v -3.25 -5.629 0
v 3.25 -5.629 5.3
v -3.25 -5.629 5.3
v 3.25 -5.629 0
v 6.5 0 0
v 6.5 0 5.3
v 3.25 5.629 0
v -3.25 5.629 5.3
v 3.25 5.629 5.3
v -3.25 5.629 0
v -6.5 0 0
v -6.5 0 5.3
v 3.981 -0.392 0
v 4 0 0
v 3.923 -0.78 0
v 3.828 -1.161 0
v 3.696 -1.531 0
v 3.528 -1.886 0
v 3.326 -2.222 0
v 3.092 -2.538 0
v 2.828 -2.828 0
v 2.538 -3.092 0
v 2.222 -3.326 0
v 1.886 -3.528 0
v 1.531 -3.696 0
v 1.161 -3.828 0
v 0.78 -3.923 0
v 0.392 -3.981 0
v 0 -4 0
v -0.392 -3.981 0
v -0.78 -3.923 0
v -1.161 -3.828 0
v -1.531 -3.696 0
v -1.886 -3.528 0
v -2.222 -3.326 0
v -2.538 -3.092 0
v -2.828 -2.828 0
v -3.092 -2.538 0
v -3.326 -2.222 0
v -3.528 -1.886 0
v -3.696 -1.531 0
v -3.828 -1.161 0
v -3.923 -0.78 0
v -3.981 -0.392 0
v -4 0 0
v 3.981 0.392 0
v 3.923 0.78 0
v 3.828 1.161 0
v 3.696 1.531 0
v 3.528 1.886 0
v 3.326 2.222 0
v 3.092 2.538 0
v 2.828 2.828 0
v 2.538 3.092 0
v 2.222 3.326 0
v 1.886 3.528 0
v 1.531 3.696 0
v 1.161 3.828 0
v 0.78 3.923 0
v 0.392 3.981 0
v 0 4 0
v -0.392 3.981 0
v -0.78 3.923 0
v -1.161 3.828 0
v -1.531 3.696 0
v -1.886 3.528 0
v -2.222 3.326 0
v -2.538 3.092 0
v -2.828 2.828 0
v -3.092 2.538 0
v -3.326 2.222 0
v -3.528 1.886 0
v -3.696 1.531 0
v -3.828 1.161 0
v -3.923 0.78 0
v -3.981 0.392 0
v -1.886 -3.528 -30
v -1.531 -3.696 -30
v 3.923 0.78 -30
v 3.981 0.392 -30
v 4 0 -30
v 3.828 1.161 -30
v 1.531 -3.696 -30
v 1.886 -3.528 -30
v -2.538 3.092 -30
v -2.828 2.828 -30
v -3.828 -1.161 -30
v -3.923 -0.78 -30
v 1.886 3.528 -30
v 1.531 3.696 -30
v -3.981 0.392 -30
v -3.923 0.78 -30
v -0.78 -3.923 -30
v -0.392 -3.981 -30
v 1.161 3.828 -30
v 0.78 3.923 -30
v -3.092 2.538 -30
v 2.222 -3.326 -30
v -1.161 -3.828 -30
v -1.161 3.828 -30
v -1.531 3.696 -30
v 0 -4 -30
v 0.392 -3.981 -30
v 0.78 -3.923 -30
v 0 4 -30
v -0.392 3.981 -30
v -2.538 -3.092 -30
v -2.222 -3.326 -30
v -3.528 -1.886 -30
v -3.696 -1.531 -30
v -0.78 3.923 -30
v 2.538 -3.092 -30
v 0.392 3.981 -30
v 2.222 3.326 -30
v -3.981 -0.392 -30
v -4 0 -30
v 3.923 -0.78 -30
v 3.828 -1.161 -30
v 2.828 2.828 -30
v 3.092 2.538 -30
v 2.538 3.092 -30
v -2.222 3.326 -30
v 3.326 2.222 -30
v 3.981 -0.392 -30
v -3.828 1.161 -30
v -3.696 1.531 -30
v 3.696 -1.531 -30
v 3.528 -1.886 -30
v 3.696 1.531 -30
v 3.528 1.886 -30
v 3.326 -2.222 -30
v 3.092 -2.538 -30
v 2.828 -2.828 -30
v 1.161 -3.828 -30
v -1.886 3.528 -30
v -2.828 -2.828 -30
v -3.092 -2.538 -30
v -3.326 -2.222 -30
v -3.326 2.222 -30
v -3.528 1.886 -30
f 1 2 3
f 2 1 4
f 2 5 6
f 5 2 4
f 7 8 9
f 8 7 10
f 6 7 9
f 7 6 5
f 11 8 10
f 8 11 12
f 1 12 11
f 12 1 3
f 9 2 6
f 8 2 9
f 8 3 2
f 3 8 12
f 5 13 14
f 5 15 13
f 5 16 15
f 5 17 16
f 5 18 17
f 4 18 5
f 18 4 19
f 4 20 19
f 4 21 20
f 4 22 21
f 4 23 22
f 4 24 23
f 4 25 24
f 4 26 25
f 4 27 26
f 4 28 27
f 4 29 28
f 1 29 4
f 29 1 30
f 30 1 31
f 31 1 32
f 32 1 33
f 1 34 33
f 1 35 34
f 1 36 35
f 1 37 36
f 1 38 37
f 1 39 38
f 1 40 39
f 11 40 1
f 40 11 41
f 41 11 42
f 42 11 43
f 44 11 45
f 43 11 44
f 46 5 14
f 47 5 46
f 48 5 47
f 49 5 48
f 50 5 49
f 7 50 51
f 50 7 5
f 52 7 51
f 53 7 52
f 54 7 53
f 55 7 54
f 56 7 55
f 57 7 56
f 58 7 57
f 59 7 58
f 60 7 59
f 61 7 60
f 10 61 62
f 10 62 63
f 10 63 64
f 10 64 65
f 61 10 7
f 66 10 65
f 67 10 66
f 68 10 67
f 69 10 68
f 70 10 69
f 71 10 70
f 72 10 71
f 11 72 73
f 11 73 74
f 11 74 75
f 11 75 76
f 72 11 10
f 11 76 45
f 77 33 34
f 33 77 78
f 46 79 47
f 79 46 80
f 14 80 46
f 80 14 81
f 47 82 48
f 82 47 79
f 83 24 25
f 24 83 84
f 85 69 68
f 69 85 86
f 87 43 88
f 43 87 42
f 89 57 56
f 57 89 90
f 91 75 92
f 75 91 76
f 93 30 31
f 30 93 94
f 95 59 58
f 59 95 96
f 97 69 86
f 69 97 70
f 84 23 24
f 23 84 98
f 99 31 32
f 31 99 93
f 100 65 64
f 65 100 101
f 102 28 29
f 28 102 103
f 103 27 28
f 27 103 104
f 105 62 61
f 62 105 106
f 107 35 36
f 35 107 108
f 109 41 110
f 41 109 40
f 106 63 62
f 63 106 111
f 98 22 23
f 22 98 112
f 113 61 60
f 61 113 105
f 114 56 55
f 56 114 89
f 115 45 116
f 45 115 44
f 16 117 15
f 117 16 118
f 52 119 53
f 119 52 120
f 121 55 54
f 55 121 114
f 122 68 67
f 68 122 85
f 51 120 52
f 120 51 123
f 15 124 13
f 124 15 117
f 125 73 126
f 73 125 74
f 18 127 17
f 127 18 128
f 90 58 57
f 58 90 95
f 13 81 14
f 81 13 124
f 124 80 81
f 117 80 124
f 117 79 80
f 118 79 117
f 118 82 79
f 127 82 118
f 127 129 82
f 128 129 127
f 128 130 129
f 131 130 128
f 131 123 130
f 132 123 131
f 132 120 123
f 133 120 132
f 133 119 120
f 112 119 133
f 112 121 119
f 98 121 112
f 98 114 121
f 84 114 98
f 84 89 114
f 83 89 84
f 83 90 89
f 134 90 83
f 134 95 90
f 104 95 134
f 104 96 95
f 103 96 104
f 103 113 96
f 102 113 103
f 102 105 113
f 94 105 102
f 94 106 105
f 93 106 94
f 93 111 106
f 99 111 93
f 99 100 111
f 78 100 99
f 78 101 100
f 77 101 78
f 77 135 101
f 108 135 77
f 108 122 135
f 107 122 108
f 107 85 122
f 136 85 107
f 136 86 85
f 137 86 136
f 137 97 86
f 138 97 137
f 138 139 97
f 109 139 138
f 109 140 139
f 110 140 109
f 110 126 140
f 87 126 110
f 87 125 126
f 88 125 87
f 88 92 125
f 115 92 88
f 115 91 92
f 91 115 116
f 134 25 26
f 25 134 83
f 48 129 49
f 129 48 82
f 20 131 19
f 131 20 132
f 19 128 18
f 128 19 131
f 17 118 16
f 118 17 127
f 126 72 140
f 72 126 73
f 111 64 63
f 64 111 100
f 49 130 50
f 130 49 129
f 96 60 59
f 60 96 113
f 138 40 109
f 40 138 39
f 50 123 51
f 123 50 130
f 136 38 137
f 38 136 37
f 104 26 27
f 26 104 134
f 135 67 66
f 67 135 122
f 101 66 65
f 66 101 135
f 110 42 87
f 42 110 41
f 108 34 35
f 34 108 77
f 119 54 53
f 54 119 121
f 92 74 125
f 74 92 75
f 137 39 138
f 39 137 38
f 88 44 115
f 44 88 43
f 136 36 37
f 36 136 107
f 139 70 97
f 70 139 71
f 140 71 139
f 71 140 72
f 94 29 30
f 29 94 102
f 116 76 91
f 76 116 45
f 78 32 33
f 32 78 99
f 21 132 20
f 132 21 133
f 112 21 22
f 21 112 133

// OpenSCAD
cylinder(h = 5.3, r = 13/(2*cos(PI/6)), $fn = 6);
translate([0, 0, -30])
    cylinder(h = 30, r = 4, $fn = 64);
